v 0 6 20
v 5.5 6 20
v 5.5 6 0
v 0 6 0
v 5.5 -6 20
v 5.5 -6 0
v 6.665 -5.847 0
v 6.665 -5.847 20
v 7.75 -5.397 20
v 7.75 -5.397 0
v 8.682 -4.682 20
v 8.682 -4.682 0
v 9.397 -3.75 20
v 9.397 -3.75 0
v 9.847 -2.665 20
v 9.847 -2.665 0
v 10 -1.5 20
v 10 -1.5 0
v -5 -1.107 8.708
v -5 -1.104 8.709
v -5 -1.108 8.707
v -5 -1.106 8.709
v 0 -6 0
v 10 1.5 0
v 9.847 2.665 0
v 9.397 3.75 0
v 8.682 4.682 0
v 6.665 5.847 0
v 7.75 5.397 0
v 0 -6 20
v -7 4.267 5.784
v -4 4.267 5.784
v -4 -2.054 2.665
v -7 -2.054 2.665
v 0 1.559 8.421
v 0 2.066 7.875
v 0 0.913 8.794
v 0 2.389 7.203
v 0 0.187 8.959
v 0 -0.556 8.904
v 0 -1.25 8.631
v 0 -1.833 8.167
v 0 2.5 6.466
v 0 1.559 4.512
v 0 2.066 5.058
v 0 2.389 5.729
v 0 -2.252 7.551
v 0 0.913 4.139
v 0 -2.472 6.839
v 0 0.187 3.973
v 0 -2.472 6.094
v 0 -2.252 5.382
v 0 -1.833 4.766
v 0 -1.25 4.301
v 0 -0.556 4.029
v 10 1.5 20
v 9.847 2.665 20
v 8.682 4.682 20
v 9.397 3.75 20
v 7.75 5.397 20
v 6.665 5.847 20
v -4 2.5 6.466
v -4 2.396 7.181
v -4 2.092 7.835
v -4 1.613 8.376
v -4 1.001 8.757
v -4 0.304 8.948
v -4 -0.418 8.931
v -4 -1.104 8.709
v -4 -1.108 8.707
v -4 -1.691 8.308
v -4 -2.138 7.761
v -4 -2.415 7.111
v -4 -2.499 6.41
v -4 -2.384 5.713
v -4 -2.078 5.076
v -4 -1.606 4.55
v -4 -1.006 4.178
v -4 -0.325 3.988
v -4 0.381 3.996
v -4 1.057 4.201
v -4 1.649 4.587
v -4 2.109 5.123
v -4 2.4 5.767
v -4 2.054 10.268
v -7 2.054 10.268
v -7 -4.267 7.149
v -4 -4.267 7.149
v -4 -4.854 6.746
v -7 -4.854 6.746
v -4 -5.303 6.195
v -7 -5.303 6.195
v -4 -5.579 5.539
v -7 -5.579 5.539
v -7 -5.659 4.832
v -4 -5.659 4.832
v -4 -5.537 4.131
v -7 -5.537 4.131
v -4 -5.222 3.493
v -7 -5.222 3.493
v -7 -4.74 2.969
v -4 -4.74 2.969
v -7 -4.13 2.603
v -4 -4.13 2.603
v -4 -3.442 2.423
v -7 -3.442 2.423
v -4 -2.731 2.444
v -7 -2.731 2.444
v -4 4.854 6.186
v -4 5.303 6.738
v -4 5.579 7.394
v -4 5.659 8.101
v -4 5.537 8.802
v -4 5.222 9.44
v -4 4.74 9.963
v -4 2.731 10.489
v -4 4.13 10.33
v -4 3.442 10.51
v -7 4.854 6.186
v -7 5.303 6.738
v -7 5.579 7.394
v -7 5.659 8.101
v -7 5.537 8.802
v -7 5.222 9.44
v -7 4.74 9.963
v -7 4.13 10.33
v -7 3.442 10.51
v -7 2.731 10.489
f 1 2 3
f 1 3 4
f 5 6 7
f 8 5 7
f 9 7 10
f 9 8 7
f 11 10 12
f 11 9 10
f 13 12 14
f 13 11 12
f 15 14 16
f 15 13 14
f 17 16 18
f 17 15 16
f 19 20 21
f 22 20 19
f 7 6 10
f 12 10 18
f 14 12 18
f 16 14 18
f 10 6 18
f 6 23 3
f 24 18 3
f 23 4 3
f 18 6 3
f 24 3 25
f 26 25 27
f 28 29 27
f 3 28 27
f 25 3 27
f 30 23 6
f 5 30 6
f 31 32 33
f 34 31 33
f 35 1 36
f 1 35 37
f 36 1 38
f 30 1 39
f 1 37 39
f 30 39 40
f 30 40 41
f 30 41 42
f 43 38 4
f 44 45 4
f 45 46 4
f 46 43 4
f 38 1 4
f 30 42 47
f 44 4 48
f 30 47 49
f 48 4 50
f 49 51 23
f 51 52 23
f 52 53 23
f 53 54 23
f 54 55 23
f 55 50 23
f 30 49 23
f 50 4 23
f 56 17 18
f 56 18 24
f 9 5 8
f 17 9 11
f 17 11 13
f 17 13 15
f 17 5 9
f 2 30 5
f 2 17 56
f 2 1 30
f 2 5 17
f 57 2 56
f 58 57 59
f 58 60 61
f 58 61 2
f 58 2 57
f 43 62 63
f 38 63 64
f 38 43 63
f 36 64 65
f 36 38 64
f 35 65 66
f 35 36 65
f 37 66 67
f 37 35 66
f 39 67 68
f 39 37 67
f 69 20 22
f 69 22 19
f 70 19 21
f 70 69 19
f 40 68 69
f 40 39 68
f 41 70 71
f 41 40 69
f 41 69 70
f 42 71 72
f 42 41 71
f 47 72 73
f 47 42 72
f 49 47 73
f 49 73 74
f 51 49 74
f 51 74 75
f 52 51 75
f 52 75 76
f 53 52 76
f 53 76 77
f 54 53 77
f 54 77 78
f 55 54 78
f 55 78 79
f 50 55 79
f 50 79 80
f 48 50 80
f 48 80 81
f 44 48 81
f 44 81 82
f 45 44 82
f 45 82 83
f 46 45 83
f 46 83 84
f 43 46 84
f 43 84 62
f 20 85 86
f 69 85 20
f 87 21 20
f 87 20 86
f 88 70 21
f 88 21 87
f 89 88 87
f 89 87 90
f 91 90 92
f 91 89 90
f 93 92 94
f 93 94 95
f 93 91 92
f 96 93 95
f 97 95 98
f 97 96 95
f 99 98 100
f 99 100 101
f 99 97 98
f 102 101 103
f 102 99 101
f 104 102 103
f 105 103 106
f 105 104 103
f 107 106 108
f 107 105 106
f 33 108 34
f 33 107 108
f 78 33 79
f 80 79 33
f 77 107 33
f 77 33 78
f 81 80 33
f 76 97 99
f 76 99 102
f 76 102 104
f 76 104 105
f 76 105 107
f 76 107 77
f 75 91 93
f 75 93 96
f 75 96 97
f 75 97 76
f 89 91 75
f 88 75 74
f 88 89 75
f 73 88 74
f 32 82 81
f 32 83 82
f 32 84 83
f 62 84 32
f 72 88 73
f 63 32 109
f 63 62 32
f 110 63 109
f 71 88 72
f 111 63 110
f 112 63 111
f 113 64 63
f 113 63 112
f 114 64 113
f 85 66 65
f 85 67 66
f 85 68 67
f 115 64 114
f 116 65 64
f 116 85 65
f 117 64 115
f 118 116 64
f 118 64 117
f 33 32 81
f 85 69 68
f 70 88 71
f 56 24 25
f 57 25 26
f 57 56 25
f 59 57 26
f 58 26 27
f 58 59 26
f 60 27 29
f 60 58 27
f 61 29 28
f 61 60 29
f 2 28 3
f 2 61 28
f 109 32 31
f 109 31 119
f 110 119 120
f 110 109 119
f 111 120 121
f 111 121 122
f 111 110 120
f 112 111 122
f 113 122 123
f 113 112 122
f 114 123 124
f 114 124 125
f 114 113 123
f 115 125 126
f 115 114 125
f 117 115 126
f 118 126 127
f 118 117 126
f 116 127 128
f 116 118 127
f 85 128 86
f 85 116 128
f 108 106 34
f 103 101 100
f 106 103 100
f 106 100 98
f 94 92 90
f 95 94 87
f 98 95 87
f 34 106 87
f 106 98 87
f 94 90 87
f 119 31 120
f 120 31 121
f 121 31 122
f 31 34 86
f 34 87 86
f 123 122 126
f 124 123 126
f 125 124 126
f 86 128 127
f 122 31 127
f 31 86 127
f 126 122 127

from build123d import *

# Parameters (mm, degrees)
PAD_DEPTH    = 20
FILLET_R     = 4.5
SKETCH001_R  = 2.5
PAD001_DEPTH = 5
PAD002_DEPTH = 3


with BuildPart() as part:
    # Sketch → Pad (new body)
    with BuildSketch(Plane.XY):
        Polygon((0, -2.5), (0, -6), (10, -6), (10, 6), (0, 6), (0, 2.5), align=None)
    extrude(amount=PAD_DEPTH)

    # Fillet
    fillet_edges = [part.edges().sort_by_distance(p)[0] for p in [
        (10, -6, 10),
        (10, 6, 10),
    ]]
    fillet(fillet_edges, radius=FILLET_R)

    # Sketch001 → Pad001 (join)
    with BuildSketch(Plane.YZ):
        with Locations((0, 6.466317)):
            Circle(SKETCH001_R)
    extrude(amount=-PAD001_DEPTH)

    # Sketch002 → Pad002 (join)
    with BuildSketch(Plane(origin=(-4, 0, 0), x_dir=(0, 0.838671, 0.544639), z_dir=(1, 0, 0))):
        with BuildLine():
            ThreePointArc((6.72858, 2.526992), (9.504552, 4.716507), (7.315037, 7.49248))
            Line((7.315037, 7.49248), (0.315037, 8.319227))
            ThreePointArc((0.315037, 8.319227), (-2.460935, 6.129712), (-0.27142, 3.353739))
            Line((6.72858, 2.526992), (-0.27142, 3.353739))
        make_face()
    extrude(amount=-PAD002_DEPTH)


solid = part.part
